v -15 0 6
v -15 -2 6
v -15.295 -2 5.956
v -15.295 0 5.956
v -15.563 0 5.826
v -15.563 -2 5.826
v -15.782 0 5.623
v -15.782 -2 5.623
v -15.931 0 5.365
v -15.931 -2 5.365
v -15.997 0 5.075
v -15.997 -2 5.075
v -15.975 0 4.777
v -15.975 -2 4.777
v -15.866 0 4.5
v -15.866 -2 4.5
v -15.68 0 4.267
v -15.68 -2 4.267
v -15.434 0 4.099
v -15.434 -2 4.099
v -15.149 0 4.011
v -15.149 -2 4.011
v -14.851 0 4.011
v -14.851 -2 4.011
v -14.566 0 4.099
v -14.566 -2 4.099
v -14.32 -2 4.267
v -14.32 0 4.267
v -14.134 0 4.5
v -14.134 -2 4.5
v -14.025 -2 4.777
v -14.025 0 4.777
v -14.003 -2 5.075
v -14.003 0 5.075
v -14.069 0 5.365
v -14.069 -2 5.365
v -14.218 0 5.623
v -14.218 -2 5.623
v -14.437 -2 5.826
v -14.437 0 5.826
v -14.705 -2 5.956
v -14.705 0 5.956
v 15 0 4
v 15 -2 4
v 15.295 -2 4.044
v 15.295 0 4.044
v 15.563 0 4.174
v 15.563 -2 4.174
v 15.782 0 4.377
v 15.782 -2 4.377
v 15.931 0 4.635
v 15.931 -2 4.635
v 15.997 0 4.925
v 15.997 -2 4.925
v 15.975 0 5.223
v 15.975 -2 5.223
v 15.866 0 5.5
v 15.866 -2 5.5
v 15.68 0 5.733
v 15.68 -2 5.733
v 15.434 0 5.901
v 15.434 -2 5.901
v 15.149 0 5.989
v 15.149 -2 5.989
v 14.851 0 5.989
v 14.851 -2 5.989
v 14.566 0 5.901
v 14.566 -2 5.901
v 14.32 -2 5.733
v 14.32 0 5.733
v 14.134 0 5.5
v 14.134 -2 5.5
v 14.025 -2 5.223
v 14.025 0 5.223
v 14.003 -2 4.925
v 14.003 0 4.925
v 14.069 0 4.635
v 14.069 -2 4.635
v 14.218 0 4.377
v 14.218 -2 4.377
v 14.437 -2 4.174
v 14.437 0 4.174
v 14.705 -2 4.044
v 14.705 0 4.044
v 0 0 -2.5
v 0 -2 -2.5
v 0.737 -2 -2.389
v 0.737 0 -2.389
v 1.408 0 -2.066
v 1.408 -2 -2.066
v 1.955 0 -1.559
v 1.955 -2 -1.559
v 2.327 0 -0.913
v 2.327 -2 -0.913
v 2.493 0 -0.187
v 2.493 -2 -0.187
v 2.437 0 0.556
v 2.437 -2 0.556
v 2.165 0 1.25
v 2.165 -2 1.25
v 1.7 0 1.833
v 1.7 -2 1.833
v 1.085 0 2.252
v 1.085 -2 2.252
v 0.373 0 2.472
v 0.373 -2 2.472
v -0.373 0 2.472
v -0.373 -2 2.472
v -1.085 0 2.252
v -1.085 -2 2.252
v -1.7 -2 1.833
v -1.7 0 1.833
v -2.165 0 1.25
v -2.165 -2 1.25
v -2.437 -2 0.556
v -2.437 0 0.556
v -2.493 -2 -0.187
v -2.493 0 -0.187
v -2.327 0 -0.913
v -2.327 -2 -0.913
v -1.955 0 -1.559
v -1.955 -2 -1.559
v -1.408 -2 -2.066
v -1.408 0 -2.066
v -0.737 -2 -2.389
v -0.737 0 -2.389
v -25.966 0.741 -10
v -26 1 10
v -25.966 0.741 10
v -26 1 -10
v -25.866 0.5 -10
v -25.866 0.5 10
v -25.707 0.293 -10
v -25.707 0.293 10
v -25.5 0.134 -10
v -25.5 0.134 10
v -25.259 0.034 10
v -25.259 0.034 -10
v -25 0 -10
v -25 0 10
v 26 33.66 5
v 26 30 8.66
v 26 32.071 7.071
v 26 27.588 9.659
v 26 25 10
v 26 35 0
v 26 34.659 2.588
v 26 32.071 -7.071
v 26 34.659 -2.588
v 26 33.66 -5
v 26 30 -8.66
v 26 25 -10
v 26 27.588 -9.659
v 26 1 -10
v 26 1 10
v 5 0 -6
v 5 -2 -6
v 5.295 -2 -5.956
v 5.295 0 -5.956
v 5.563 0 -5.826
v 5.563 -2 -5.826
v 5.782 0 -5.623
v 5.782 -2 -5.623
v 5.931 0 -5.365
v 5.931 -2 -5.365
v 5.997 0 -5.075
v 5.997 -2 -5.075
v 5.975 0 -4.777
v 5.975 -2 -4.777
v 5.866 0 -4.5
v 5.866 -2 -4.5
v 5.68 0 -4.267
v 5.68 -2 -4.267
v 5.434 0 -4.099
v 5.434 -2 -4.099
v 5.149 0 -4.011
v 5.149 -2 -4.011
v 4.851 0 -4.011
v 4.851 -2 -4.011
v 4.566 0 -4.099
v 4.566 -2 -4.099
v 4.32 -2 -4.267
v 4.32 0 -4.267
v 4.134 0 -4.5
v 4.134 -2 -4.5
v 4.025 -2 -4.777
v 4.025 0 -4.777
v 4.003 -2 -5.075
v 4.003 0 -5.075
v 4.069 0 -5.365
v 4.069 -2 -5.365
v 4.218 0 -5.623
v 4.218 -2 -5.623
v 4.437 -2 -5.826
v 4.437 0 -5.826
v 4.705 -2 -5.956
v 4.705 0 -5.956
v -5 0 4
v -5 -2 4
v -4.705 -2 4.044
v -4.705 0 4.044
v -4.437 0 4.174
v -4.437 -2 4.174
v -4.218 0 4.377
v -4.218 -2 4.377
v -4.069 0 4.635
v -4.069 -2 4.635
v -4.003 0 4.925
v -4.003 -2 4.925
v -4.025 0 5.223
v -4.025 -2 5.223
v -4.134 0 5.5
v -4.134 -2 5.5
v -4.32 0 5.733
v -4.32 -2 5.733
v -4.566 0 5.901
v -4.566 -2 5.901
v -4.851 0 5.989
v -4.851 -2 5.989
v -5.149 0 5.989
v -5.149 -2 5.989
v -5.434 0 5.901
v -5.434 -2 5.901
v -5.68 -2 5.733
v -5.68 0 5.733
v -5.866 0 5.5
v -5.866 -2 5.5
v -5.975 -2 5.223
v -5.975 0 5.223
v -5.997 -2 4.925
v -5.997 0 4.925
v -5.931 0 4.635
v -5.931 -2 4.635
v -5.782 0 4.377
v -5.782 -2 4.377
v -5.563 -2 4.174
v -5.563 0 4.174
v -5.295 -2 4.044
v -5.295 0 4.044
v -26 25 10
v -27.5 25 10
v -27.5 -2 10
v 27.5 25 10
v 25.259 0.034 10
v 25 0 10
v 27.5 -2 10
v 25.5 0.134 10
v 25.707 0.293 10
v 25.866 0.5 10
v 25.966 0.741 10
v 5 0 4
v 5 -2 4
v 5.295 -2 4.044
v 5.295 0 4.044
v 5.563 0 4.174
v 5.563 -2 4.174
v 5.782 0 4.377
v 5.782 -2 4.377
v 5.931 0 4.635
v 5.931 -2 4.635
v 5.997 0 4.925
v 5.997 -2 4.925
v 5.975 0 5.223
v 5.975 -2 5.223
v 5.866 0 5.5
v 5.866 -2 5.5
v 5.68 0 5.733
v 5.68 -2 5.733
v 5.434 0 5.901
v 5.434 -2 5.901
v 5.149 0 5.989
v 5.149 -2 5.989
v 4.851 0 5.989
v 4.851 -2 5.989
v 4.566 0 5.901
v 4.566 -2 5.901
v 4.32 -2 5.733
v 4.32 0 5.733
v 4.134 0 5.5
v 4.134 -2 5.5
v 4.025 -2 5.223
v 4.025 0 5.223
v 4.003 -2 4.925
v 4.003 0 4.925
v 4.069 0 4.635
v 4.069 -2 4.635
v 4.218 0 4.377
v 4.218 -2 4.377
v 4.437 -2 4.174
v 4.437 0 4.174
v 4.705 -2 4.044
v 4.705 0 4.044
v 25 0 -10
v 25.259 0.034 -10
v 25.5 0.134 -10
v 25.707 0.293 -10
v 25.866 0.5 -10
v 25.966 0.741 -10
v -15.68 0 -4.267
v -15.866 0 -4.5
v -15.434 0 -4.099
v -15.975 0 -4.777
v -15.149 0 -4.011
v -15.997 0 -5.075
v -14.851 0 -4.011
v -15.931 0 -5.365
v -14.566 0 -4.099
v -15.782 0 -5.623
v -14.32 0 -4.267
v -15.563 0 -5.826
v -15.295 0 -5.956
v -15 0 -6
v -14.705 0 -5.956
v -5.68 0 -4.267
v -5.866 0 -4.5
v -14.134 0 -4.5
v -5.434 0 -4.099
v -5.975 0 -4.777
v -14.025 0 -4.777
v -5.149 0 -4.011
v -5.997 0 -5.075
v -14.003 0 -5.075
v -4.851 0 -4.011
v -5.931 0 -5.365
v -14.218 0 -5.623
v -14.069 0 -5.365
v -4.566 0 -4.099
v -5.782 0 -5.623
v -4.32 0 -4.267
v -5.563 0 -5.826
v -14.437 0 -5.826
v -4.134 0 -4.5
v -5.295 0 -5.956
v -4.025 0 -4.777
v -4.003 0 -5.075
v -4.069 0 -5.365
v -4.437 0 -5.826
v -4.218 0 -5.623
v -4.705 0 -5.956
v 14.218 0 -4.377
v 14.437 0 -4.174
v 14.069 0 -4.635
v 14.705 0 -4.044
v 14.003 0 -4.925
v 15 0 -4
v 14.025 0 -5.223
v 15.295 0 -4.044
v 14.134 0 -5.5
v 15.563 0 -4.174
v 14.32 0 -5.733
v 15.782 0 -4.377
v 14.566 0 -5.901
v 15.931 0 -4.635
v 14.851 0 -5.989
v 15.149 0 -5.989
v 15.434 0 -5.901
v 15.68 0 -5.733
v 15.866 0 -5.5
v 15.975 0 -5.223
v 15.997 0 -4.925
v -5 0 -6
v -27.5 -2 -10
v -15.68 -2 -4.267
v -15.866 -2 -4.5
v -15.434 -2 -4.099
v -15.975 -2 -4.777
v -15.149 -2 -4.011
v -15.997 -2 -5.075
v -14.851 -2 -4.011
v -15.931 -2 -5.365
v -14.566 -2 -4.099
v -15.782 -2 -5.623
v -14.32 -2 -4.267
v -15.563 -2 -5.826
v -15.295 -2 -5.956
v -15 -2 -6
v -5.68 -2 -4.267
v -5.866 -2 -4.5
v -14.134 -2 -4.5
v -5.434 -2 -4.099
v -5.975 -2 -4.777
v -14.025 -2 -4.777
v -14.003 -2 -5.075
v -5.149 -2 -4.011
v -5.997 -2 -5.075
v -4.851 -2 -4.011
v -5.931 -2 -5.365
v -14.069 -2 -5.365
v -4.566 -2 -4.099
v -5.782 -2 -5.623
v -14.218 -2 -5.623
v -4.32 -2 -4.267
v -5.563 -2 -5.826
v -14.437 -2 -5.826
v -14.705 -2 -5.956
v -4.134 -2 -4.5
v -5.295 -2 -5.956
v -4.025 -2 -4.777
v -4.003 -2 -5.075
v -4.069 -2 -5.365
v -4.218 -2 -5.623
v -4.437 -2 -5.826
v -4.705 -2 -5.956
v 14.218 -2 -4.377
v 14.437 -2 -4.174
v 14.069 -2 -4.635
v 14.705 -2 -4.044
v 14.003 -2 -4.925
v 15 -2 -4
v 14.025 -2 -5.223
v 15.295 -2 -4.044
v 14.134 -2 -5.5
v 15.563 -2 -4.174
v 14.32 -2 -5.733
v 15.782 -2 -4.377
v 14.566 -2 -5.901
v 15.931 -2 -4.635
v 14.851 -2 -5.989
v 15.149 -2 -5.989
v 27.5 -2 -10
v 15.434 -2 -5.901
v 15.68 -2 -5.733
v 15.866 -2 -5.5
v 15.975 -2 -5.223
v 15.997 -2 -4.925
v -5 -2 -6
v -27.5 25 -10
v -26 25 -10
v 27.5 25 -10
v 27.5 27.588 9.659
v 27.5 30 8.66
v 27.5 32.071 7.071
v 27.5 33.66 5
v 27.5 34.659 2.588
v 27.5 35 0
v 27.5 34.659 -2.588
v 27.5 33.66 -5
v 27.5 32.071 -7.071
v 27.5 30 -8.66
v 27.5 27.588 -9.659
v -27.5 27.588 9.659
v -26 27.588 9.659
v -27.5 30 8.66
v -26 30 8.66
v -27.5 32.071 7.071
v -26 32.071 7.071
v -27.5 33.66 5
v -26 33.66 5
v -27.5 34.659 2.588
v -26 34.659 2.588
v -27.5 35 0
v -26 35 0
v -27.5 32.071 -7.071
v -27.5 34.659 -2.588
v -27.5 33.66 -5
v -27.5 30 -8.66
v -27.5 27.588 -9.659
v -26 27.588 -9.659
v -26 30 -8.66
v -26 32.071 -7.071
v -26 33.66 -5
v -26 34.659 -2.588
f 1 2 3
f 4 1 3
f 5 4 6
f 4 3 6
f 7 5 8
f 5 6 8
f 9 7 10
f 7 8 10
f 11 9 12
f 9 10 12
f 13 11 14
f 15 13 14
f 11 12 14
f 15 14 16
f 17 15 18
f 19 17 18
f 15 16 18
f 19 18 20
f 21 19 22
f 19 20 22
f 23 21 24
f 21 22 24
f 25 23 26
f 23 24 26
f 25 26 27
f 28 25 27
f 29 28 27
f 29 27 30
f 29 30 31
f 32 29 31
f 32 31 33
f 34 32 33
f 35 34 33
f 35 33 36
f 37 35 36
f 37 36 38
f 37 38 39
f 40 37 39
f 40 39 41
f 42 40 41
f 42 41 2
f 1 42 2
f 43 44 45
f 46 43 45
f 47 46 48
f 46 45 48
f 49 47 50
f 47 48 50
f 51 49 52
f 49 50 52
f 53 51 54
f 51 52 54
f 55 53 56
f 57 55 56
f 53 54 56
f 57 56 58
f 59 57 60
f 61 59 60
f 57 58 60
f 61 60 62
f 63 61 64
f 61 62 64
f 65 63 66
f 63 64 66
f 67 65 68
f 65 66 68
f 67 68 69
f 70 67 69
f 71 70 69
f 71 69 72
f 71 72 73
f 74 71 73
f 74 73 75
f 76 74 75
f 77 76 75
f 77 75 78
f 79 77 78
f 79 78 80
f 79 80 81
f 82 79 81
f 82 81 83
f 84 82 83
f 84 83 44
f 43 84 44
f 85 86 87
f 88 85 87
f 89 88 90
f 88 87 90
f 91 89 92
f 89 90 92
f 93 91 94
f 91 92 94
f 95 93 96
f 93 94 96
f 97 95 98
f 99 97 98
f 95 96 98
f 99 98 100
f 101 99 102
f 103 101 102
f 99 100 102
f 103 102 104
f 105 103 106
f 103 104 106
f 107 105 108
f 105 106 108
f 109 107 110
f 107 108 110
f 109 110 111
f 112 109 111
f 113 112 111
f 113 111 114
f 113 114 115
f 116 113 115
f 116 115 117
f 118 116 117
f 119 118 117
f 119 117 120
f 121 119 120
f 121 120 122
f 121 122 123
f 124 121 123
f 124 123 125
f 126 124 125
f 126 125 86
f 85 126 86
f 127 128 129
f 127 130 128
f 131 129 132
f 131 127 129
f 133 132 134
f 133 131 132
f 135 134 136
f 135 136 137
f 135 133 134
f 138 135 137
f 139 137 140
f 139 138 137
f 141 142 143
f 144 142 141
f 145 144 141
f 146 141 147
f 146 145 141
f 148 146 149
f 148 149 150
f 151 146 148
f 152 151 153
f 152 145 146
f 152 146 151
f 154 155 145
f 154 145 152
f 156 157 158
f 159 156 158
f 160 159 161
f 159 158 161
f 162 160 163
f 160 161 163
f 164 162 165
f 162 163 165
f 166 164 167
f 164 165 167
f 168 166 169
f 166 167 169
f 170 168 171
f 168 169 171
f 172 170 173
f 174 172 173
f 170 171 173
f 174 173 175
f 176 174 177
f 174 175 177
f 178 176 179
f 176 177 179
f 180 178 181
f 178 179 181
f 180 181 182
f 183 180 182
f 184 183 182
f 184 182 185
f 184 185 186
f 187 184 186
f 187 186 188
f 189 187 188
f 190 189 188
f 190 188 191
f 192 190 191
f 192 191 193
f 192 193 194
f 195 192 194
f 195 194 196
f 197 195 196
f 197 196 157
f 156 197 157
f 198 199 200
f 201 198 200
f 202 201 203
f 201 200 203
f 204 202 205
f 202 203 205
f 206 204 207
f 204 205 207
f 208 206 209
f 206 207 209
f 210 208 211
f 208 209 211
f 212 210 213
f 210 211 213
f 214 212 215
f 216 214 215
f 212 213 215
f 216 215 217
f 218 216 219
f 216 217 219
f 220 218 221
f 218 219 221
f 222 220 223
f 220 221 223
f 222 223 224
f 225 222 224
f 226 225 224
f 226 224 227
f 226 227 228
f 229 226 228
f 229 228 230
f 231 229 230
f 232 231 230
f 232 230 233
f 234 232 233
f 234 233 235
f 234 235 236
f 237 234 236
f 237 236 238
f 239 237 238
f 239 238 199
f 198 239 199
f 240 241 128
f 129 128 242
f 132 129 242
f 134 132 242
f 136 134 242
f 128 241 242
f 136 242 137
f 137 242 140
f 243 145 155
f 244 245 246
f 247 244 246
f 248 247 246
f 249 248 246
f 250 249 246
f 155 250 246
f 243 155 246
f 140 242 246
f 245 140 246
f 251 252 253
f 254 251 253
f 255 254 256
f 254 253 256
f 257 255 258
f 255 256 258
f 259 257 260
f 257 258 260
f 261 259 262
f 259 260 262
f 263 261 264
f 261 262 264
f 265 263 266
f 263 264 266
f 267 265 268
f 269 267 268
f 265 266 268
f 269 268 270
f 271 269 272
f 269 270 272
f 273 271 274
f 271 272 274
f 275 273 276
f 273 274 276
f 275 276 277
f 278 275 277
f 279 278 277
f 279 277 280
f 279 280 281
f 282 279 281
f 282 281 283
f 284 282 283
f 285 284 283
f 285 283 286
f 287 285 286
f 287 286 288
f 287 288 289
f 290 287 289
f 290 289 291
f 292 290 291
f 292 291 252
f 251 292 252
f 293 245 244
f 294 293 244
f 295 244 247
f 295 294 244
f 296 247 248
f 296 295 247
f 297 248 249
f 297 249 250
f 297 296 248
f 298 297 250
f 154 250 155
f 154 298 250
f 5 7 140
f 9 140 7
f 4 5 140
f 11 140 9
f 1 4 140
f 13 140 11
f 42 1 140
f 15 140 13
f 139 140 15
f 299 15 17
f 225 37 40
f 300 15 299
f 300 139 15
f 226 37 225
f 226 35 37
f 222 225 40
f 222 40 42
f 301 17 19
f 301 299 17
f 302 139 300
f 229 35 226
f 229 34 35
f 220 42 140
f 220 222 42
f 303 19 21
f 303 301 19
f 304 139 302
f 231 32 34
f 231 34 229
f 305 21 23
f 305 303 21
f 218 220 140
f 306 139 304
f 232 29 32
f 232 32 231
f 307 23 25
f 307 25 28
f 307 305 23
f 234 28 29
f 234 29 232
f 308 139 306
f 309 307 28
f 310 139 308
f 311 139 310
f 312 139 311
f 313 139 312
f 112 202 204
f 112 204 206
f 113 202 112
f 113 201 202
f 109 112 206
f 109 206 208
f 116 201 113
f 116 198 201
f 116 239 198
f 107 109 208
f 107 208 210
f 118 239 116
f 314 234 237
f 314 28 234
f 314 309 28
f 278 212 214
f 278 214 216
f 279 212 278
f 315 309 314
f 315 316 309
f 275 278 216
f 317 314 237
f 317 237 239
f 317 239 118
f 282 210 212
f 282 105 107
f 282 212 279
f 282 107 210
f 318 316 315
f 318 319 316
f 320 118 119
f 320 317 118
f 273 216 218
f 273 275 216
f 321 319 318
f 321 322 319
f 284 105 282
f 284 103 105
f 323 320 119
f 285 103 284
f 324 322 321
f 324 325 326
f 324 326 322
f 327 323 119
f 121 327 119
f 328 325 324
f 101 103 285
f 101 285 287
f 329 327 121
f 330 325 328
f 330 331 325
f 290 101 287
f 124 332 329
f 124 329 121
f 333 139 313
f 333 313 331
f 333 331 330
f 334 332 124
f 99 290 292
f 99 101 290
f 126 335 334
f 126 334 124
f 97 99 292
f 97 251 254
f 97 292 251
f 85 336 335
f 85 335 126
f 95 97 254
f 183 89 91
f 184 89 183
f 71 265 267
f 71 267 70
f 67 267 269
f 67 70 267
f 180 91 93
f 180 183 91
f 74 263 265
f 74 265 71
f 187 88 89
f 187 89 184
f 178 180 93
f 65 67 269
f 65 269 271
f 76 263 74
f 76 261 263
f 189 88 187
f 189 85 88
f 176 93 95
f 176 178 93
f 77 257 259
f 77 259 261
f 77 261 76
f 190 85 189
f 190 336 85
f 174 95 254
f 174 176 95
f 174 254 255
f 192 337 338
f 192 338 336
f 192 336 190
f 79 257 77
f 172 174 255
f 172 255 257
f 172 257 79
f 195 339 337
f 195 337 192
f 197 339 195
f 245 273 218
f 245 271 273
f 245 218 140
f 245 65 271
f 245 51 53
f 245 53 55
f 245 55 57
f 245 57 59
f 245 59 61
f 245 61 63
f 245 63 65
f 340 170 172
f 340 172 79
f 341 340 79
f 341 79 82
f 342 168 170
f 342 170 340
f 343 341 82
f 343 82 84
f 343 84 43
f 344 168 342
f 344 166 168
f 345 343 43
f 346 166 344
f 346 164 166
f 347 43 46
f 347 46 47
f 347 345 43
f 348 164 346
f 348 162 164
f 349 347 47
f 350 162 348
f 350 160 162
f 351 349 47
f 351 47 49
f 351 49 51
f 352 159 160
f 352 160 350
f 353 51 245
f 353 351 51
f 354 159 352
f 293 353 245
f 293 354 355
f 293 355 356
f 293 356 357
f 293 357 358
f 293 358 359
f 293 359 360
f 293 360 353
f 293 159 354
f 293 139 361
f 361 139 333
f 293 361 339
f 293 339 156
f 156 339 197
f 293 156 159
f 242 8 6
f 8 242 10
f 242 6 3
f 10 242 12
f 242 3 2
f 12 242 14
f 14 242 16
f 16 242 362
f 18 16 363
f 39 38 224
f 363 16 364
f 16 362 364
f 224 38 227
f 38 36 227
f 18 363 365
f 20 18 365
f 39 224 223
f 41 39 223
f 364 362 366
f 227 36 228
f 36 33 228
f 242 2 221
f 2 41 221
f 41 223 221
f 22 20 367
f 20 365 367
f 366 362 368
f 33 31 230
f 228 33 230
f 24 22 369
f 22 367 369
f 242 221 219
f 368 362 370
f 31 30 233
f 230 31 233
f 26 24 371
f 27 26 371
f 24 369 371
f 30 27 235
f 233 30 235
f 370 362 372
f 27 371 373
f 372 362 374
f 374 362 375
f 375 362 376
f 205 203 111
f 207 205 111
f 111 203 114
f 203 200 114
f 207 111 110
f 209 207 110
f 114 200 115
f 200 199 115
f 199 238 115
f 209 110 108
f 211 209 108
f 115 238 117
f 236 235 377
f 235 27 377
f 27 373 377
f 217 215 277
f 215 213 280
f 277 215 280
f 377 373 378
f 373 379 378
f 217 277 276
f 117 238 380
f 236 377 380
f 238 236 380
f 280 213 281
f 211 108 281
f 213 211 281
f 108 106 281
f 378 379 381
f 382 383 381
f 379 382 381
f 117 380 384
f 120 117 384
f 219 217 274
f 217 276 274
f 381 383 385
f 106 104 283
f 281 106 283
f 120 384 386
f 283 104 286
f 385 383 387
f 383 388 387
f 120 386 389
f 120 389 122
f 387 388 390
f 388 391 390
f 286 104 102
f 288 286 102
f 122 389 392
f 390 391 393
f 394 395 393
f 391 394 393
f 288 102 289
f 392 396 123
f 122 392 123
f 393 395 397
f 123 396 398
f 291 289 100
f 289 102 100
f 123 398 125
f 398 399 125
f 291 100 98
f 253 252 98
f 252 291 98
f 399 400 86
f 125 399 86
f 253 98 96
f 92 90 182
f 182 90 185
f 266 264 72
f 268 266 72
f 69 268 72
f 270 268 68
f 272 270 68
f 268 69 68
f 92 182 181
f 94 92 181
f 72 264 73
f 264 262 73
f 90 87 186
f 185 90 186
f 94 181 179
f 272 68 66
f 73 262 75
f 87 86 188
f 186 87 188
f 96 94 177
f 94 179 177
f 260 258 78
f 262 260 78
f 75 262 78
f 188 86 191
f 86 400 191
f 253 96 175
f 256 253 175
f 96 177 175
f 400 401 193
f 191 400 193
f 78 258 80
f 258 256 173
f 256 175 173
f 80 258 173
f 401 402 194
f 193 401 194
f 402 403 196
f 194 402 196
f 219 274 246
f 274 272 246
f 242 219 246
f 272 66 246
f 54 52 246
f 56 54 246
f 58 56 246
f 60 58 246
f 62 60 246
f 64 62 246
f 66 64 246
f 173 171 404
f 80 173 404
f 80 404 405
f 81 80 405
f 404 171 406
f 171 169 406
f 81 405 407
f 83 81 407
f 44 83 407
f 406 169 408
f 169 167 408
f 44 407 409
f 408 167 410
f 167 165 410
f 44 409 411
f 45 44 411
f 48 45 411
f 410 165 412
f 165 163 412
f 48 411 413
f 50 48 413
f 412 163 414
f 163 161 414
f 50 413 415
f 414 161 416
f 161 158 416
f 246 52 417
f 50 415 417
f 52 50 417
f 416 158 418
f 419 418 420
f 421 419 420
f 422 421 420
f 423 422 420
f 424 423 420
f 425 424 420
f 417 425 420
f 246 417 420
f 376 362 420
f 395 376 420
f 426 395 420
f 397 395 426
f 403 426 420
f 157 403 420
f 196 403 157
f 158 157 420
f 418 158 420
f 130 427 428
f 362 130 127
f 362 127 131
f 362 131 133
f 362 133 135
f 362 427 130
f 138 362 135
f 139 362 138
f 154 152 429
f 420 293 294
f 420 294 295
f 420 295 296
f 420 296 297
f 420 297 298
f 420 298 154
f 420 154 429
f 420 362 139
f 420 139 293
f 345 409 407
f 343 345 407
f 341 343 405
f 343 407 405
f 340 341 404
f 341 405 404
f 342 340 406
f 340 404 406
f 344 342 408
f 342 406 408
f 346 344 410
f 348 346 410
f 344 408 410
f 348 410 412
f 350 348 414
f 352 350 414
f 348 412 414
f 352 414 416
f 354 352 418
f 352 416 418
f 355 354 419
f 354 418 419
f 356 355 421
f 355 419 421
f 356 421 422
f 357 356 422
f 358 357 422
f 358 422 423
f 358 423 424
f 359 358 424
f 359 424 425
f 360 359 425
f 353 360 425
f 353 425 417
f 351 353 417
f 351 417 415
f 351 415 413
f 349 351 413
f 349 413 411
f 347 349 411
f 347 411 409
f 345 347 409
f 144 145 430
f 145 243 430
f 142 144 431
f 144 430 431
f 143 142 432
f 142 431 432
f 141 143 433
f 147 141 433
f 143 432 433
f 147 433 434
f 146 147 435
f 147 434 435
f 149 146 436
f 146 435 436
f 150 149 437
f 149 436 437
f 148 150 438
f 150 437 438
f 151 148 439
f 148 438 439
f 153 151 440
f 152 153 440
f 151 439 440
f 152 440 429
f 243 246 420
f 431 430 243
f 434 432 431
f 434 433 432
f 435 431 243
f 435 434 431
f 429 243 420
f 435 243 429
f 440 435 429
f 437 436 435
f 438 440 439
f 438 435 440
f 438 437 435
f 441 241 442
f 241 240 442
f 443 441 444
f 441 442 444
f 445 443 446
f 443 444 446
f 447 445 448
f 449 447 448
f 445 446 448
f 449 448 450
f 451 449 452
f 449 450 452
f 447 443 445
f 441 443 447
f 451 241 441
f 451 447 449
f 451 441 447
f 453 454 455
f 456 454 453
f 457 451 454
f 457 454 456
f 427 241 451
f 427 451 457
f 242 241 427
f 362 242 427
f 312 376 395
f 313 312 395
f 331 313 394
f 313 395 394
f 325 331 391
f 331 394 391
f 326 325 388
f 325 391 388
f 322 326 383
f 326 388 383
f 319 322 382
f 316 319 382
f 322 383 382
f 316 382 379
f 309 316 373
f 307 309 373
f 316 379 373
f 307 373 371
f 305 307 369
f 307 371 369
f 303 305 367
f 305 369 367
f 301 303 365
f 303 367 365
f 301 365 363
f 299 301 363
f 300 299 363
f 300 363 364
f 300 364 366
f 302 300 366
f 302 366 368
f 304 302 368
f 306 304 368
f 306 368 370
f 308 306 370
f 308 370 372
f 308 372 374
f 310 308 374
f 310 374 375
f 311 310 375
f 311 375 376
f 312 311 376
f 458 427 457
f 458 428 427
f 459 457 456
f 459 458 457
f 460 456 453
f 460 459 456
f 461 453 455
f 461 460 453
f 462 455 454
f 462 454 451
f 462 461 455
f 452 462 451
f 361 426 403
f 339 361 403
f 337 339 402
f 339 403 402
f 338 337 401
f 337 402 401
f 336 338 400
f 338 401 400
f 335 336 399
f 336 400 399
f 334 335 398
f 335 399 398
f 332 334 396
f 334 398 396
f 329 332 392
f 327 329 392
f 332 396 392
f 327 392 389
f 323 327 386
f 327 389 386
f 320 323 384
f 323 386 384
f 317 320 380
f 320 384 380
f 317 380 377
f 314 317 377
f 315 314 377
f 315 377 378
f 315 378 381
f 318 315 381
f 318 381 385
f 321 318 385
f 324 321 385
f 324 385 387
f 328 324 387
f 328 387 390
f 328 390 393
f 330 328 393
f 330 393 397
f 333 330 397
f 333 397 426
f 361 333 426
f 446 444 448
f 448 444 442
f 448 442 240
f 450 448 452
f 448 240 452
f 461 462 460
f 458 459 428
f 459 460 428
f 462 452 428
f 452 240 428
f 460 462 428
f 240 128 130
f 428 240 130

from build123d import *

# Parameters (mm, degrees)
SKETCH_1_W          = 55
SKETCH_1_H          = 20
EXTRUDE_1_DEPTH     = 2
SKETCH_3_W          = 1.5
SKETCH_3_H          = 20
EXTRUDE_2_DEPTH     = 35
FILLET_1_R          = 10
FILLET_3_R          = 1
CUT_EXTRUDE_1_REACH = 49.173
SKETCH_6_R          = 2.5
SKETCH_6_R_2        = 1


with BuildPart() as part:
    # 草图1 → 凸台-拉伸1 (new body)
    with BuildSketch(Plane(origin=(0, 0, 0), x_dir=(1, 0, 0), z_dir=(0, 1, 0))):
        Rectangle(SKETCH_1_W, SKETCH_1_H)
    extrude(amount=-EXTRUDE_1_DEPTH)

    # 草图3 → 凸台-拉伸2 (add)
    with BuildSketch(Plane(origin=(0, 0, 0), x_dir=(1, 0, 0), z_dir=(0, 1, 0))):
        with Locations((-26.75, 0)):
            Rectangle(SKETCH_3_W, SKETCH_3_H)
        with Locations((26.75, 0)):
            Rectangle(SKETCH_3_W, SKETCH_3_H)
    extrude(amount=EXTRUDE_2_DEPTH)

    # 圆角1
    fillet_1_edges = [part.edges().sort_by_distance(p)[0] for p in [
        (-26.75, 35, -10),
        (-26.75, 35, 10),
        (26.75, 35, 10),
        (26.75, 35, -10),
    ]]
    fillet(fillet_1_edges, radius=FILLET_1_R - 0.0001)  # a hair under: the kernel refuses the full size

    # 圆角3
    fillet_3_edges = [part.edges().sort_by_distance(p)[0] for p in [
        (-26, 0, 0),
        (26, 0, 0),
    ]]
    fillet(fillet_3_edges, radius=FILLET_3_R)

    # 草图6 → 切除-拉伸1 (cut, up to next)
    with BuildSketch(Plane.XZ.offset(2), mode=Mode.PRIVATE) as cut_extrude_1_sk1:
        with Locations(Location((0, 0, 0), (0, 0, 270))):
            Circle(SKETCH_6_R)
    cut_extrude_1_tool1 = extrude(cut_extrude_1_sk1.sketch, amount=-CUT_EXTRUDE_1_REACH, mode=Mode.PRIVATE) & part.part
    # 草图6 → 切除-拉伸1 (cut, up to next)
    with BuildSketch(Plane.XZ.offset(2), mode=Mode.PRIVATE) as cut_extrude_1_sk2:
        with Locations(Location((-5, 5, 0), (0, 0, 270))):
            Circle(SKETCH_6_R_2)
    cut_extrude_1_tool2 = extrude(cut_extrude_1_sk2.sketch, amount=-CUT_EXTRUDE_1_REACH, mode=Mode.PRIVATE) & part.part
    # 草图6 → 切除-拉伸1 (cut, up to next)
    with BuildSketch(Plane.XZ.offset(2), mode=Mode.PRIVATE) as cut_extrude_1_sk3:
        with Locations(Location((-5, -5, 0), (0, 0, 270))):
            Circle(SKETCH_6_R_2)
    cut_extrude_1_tool3 = extrude(cut_extrude_1_sk3.sketch, amount=-CUT_EXTRUDE_1_REACH, mode=Mode.PRIVATE) & part.part
    # 草图6 → 切除-拉伸1 (cut, up to next)
    with BuildSketch(Plane.XZ.offset(2), mode=Mode.PRIVATE) as cut_extrude_1_sk4:
        with Locations(Location((5, -5, 0), (0, 0, 270))):
            Circle(SKETCH_6_R_2)
    cut_extrude_1_tool4 = extrude(cut_extrude_1_sk4.sketch, amount=-CUT_EXTRUDE_1_REACH, mode=Mode.PRIVATE) & part.part
    # 草图6 → 切除-拉伸1 (cut, up to next)
    with BuildSketch(Plane.XZ.offset(2), mode=Mode.PRIVATE) as cut_extrude_1_sk5:
        with Locations(Location((5, 5, 0), (0, 0, 270))):
            Circle(SKETCH_6_R_2)
    cut_extrude_1_tool5 = extrude(cut_extrude_1_sk5.sketch, amount=-CUT_EXTRUDE_1_REACH, mode=Mode.PRIVATE) & part.part
    # 草图6 → 切除-拉伸1 (cut, up to next)
    with BuildSketch(Plane.XZ.offset(2), mode=Mode.PRIVATE) as cut_extrude_1_sk6:
        with Locations(Location((15, 5, 0), (0, 0, 270))):
            Circle(SKETCH_6_R_2)
    cut_extrude_1_tool6 = extrude(cut_extrude_1_sk6.sketch, amount=-CUT_EXTRUDE_1_REACH, mode=Mode.PRIVATE) & part.part
    # 草图6 → 切除-拉伸1 (cut, up to next)
    with BuildSketch(Plane.XZ.offset(2), mode=Mode.PRIVATE) as cut_extrude_1_sk7:
        with Locations(Location((-15, 5, 0), (0, 0, 90))):
            Circle(SKETCH_6_R_2)
    cut_extrude_1_tool7 = extrude(cut_extrude_1_sk7.sketch, amount=-CUT_EXTRUDE_1_REACH, mode=Mode.PRIVATE) & part.part
    # 草图6 → 切除-拉伸1 (cut, up to next)
    with BuildSketch(Plane.XZ.offset(2), mode=Mode.PRIVATE) as cut_extrude_1_sk8:
        with Locations(Location((15, -5, 0), (0, 0, 90))):
            Circle(SKETCH_6_R_2)
    cut_extrude_1_tool8 = extrude(cut_extrude_1_sk8.sketch, amount=-CUT_EXTRUDE_1_REACH, mode=Mode.PRIVATE) & part.part
    # 草图6 → 切除-拉伸1 (cut, up to next)
    with BuildSketch(Plane.XZ.offset(2), mode=Mode.PRIVATE) as cut_extrude_1_sk9:
        with Locations(Location((-15, -5, 0), (0, 0, 270))):
            Circle(SKETCH_6_R_2)
    cut_extrude_1_tool9 = extrude(cut_extrude_1_sk9.sketch, amount=-CUT_EXTRUDE_1_REACH, mode=Mode.PRIVATE) & part.part
    add(cut_extrude_1_tool1.solids().sort_by_distance((0, -2, 0))[0], mode=Mode.SUBTRACT)
    add(cut_extrude_1_tool2.solids().sort_by_distance((-5, -2, 5))[0], mode=Mode.SUBTRACT)
    add(cut_extrude_1_tool3.solids().sort_by_distance((-5, -2, -5))[0], mode=Mode.SUBTRACT)
    add(cut_extrude_1_tool4.solids().sort_by_distance((5, -2, -5))[0], mode=Mode.SUBTRACT)
    add(cut_extrude_1_tool5.solids().sort_by_distance((5, -2, 5))[0], mode=Mode.SUBTRACT)
    add(cut_extrude_1_tool6.solids().sort_by_distance((15, -2, 5))[0], mode=Mode.SUBTRACT)
    add(cut_extrude_1_tool7.solids().sort_by_distance((-15, -2, 5))[0], mode=Mode.SUBTRACT)
    add(cut_extrude_1_tool8.solids().sort_by_distance((15, -2, -5))[0], mode=Mode.SUBTRACT)
    add(cut_extrude_1_tool9.solids().sort_by_distance((-15, -2, -5))[0], mode=Mode.SUBTRACT)


solid = part.part
